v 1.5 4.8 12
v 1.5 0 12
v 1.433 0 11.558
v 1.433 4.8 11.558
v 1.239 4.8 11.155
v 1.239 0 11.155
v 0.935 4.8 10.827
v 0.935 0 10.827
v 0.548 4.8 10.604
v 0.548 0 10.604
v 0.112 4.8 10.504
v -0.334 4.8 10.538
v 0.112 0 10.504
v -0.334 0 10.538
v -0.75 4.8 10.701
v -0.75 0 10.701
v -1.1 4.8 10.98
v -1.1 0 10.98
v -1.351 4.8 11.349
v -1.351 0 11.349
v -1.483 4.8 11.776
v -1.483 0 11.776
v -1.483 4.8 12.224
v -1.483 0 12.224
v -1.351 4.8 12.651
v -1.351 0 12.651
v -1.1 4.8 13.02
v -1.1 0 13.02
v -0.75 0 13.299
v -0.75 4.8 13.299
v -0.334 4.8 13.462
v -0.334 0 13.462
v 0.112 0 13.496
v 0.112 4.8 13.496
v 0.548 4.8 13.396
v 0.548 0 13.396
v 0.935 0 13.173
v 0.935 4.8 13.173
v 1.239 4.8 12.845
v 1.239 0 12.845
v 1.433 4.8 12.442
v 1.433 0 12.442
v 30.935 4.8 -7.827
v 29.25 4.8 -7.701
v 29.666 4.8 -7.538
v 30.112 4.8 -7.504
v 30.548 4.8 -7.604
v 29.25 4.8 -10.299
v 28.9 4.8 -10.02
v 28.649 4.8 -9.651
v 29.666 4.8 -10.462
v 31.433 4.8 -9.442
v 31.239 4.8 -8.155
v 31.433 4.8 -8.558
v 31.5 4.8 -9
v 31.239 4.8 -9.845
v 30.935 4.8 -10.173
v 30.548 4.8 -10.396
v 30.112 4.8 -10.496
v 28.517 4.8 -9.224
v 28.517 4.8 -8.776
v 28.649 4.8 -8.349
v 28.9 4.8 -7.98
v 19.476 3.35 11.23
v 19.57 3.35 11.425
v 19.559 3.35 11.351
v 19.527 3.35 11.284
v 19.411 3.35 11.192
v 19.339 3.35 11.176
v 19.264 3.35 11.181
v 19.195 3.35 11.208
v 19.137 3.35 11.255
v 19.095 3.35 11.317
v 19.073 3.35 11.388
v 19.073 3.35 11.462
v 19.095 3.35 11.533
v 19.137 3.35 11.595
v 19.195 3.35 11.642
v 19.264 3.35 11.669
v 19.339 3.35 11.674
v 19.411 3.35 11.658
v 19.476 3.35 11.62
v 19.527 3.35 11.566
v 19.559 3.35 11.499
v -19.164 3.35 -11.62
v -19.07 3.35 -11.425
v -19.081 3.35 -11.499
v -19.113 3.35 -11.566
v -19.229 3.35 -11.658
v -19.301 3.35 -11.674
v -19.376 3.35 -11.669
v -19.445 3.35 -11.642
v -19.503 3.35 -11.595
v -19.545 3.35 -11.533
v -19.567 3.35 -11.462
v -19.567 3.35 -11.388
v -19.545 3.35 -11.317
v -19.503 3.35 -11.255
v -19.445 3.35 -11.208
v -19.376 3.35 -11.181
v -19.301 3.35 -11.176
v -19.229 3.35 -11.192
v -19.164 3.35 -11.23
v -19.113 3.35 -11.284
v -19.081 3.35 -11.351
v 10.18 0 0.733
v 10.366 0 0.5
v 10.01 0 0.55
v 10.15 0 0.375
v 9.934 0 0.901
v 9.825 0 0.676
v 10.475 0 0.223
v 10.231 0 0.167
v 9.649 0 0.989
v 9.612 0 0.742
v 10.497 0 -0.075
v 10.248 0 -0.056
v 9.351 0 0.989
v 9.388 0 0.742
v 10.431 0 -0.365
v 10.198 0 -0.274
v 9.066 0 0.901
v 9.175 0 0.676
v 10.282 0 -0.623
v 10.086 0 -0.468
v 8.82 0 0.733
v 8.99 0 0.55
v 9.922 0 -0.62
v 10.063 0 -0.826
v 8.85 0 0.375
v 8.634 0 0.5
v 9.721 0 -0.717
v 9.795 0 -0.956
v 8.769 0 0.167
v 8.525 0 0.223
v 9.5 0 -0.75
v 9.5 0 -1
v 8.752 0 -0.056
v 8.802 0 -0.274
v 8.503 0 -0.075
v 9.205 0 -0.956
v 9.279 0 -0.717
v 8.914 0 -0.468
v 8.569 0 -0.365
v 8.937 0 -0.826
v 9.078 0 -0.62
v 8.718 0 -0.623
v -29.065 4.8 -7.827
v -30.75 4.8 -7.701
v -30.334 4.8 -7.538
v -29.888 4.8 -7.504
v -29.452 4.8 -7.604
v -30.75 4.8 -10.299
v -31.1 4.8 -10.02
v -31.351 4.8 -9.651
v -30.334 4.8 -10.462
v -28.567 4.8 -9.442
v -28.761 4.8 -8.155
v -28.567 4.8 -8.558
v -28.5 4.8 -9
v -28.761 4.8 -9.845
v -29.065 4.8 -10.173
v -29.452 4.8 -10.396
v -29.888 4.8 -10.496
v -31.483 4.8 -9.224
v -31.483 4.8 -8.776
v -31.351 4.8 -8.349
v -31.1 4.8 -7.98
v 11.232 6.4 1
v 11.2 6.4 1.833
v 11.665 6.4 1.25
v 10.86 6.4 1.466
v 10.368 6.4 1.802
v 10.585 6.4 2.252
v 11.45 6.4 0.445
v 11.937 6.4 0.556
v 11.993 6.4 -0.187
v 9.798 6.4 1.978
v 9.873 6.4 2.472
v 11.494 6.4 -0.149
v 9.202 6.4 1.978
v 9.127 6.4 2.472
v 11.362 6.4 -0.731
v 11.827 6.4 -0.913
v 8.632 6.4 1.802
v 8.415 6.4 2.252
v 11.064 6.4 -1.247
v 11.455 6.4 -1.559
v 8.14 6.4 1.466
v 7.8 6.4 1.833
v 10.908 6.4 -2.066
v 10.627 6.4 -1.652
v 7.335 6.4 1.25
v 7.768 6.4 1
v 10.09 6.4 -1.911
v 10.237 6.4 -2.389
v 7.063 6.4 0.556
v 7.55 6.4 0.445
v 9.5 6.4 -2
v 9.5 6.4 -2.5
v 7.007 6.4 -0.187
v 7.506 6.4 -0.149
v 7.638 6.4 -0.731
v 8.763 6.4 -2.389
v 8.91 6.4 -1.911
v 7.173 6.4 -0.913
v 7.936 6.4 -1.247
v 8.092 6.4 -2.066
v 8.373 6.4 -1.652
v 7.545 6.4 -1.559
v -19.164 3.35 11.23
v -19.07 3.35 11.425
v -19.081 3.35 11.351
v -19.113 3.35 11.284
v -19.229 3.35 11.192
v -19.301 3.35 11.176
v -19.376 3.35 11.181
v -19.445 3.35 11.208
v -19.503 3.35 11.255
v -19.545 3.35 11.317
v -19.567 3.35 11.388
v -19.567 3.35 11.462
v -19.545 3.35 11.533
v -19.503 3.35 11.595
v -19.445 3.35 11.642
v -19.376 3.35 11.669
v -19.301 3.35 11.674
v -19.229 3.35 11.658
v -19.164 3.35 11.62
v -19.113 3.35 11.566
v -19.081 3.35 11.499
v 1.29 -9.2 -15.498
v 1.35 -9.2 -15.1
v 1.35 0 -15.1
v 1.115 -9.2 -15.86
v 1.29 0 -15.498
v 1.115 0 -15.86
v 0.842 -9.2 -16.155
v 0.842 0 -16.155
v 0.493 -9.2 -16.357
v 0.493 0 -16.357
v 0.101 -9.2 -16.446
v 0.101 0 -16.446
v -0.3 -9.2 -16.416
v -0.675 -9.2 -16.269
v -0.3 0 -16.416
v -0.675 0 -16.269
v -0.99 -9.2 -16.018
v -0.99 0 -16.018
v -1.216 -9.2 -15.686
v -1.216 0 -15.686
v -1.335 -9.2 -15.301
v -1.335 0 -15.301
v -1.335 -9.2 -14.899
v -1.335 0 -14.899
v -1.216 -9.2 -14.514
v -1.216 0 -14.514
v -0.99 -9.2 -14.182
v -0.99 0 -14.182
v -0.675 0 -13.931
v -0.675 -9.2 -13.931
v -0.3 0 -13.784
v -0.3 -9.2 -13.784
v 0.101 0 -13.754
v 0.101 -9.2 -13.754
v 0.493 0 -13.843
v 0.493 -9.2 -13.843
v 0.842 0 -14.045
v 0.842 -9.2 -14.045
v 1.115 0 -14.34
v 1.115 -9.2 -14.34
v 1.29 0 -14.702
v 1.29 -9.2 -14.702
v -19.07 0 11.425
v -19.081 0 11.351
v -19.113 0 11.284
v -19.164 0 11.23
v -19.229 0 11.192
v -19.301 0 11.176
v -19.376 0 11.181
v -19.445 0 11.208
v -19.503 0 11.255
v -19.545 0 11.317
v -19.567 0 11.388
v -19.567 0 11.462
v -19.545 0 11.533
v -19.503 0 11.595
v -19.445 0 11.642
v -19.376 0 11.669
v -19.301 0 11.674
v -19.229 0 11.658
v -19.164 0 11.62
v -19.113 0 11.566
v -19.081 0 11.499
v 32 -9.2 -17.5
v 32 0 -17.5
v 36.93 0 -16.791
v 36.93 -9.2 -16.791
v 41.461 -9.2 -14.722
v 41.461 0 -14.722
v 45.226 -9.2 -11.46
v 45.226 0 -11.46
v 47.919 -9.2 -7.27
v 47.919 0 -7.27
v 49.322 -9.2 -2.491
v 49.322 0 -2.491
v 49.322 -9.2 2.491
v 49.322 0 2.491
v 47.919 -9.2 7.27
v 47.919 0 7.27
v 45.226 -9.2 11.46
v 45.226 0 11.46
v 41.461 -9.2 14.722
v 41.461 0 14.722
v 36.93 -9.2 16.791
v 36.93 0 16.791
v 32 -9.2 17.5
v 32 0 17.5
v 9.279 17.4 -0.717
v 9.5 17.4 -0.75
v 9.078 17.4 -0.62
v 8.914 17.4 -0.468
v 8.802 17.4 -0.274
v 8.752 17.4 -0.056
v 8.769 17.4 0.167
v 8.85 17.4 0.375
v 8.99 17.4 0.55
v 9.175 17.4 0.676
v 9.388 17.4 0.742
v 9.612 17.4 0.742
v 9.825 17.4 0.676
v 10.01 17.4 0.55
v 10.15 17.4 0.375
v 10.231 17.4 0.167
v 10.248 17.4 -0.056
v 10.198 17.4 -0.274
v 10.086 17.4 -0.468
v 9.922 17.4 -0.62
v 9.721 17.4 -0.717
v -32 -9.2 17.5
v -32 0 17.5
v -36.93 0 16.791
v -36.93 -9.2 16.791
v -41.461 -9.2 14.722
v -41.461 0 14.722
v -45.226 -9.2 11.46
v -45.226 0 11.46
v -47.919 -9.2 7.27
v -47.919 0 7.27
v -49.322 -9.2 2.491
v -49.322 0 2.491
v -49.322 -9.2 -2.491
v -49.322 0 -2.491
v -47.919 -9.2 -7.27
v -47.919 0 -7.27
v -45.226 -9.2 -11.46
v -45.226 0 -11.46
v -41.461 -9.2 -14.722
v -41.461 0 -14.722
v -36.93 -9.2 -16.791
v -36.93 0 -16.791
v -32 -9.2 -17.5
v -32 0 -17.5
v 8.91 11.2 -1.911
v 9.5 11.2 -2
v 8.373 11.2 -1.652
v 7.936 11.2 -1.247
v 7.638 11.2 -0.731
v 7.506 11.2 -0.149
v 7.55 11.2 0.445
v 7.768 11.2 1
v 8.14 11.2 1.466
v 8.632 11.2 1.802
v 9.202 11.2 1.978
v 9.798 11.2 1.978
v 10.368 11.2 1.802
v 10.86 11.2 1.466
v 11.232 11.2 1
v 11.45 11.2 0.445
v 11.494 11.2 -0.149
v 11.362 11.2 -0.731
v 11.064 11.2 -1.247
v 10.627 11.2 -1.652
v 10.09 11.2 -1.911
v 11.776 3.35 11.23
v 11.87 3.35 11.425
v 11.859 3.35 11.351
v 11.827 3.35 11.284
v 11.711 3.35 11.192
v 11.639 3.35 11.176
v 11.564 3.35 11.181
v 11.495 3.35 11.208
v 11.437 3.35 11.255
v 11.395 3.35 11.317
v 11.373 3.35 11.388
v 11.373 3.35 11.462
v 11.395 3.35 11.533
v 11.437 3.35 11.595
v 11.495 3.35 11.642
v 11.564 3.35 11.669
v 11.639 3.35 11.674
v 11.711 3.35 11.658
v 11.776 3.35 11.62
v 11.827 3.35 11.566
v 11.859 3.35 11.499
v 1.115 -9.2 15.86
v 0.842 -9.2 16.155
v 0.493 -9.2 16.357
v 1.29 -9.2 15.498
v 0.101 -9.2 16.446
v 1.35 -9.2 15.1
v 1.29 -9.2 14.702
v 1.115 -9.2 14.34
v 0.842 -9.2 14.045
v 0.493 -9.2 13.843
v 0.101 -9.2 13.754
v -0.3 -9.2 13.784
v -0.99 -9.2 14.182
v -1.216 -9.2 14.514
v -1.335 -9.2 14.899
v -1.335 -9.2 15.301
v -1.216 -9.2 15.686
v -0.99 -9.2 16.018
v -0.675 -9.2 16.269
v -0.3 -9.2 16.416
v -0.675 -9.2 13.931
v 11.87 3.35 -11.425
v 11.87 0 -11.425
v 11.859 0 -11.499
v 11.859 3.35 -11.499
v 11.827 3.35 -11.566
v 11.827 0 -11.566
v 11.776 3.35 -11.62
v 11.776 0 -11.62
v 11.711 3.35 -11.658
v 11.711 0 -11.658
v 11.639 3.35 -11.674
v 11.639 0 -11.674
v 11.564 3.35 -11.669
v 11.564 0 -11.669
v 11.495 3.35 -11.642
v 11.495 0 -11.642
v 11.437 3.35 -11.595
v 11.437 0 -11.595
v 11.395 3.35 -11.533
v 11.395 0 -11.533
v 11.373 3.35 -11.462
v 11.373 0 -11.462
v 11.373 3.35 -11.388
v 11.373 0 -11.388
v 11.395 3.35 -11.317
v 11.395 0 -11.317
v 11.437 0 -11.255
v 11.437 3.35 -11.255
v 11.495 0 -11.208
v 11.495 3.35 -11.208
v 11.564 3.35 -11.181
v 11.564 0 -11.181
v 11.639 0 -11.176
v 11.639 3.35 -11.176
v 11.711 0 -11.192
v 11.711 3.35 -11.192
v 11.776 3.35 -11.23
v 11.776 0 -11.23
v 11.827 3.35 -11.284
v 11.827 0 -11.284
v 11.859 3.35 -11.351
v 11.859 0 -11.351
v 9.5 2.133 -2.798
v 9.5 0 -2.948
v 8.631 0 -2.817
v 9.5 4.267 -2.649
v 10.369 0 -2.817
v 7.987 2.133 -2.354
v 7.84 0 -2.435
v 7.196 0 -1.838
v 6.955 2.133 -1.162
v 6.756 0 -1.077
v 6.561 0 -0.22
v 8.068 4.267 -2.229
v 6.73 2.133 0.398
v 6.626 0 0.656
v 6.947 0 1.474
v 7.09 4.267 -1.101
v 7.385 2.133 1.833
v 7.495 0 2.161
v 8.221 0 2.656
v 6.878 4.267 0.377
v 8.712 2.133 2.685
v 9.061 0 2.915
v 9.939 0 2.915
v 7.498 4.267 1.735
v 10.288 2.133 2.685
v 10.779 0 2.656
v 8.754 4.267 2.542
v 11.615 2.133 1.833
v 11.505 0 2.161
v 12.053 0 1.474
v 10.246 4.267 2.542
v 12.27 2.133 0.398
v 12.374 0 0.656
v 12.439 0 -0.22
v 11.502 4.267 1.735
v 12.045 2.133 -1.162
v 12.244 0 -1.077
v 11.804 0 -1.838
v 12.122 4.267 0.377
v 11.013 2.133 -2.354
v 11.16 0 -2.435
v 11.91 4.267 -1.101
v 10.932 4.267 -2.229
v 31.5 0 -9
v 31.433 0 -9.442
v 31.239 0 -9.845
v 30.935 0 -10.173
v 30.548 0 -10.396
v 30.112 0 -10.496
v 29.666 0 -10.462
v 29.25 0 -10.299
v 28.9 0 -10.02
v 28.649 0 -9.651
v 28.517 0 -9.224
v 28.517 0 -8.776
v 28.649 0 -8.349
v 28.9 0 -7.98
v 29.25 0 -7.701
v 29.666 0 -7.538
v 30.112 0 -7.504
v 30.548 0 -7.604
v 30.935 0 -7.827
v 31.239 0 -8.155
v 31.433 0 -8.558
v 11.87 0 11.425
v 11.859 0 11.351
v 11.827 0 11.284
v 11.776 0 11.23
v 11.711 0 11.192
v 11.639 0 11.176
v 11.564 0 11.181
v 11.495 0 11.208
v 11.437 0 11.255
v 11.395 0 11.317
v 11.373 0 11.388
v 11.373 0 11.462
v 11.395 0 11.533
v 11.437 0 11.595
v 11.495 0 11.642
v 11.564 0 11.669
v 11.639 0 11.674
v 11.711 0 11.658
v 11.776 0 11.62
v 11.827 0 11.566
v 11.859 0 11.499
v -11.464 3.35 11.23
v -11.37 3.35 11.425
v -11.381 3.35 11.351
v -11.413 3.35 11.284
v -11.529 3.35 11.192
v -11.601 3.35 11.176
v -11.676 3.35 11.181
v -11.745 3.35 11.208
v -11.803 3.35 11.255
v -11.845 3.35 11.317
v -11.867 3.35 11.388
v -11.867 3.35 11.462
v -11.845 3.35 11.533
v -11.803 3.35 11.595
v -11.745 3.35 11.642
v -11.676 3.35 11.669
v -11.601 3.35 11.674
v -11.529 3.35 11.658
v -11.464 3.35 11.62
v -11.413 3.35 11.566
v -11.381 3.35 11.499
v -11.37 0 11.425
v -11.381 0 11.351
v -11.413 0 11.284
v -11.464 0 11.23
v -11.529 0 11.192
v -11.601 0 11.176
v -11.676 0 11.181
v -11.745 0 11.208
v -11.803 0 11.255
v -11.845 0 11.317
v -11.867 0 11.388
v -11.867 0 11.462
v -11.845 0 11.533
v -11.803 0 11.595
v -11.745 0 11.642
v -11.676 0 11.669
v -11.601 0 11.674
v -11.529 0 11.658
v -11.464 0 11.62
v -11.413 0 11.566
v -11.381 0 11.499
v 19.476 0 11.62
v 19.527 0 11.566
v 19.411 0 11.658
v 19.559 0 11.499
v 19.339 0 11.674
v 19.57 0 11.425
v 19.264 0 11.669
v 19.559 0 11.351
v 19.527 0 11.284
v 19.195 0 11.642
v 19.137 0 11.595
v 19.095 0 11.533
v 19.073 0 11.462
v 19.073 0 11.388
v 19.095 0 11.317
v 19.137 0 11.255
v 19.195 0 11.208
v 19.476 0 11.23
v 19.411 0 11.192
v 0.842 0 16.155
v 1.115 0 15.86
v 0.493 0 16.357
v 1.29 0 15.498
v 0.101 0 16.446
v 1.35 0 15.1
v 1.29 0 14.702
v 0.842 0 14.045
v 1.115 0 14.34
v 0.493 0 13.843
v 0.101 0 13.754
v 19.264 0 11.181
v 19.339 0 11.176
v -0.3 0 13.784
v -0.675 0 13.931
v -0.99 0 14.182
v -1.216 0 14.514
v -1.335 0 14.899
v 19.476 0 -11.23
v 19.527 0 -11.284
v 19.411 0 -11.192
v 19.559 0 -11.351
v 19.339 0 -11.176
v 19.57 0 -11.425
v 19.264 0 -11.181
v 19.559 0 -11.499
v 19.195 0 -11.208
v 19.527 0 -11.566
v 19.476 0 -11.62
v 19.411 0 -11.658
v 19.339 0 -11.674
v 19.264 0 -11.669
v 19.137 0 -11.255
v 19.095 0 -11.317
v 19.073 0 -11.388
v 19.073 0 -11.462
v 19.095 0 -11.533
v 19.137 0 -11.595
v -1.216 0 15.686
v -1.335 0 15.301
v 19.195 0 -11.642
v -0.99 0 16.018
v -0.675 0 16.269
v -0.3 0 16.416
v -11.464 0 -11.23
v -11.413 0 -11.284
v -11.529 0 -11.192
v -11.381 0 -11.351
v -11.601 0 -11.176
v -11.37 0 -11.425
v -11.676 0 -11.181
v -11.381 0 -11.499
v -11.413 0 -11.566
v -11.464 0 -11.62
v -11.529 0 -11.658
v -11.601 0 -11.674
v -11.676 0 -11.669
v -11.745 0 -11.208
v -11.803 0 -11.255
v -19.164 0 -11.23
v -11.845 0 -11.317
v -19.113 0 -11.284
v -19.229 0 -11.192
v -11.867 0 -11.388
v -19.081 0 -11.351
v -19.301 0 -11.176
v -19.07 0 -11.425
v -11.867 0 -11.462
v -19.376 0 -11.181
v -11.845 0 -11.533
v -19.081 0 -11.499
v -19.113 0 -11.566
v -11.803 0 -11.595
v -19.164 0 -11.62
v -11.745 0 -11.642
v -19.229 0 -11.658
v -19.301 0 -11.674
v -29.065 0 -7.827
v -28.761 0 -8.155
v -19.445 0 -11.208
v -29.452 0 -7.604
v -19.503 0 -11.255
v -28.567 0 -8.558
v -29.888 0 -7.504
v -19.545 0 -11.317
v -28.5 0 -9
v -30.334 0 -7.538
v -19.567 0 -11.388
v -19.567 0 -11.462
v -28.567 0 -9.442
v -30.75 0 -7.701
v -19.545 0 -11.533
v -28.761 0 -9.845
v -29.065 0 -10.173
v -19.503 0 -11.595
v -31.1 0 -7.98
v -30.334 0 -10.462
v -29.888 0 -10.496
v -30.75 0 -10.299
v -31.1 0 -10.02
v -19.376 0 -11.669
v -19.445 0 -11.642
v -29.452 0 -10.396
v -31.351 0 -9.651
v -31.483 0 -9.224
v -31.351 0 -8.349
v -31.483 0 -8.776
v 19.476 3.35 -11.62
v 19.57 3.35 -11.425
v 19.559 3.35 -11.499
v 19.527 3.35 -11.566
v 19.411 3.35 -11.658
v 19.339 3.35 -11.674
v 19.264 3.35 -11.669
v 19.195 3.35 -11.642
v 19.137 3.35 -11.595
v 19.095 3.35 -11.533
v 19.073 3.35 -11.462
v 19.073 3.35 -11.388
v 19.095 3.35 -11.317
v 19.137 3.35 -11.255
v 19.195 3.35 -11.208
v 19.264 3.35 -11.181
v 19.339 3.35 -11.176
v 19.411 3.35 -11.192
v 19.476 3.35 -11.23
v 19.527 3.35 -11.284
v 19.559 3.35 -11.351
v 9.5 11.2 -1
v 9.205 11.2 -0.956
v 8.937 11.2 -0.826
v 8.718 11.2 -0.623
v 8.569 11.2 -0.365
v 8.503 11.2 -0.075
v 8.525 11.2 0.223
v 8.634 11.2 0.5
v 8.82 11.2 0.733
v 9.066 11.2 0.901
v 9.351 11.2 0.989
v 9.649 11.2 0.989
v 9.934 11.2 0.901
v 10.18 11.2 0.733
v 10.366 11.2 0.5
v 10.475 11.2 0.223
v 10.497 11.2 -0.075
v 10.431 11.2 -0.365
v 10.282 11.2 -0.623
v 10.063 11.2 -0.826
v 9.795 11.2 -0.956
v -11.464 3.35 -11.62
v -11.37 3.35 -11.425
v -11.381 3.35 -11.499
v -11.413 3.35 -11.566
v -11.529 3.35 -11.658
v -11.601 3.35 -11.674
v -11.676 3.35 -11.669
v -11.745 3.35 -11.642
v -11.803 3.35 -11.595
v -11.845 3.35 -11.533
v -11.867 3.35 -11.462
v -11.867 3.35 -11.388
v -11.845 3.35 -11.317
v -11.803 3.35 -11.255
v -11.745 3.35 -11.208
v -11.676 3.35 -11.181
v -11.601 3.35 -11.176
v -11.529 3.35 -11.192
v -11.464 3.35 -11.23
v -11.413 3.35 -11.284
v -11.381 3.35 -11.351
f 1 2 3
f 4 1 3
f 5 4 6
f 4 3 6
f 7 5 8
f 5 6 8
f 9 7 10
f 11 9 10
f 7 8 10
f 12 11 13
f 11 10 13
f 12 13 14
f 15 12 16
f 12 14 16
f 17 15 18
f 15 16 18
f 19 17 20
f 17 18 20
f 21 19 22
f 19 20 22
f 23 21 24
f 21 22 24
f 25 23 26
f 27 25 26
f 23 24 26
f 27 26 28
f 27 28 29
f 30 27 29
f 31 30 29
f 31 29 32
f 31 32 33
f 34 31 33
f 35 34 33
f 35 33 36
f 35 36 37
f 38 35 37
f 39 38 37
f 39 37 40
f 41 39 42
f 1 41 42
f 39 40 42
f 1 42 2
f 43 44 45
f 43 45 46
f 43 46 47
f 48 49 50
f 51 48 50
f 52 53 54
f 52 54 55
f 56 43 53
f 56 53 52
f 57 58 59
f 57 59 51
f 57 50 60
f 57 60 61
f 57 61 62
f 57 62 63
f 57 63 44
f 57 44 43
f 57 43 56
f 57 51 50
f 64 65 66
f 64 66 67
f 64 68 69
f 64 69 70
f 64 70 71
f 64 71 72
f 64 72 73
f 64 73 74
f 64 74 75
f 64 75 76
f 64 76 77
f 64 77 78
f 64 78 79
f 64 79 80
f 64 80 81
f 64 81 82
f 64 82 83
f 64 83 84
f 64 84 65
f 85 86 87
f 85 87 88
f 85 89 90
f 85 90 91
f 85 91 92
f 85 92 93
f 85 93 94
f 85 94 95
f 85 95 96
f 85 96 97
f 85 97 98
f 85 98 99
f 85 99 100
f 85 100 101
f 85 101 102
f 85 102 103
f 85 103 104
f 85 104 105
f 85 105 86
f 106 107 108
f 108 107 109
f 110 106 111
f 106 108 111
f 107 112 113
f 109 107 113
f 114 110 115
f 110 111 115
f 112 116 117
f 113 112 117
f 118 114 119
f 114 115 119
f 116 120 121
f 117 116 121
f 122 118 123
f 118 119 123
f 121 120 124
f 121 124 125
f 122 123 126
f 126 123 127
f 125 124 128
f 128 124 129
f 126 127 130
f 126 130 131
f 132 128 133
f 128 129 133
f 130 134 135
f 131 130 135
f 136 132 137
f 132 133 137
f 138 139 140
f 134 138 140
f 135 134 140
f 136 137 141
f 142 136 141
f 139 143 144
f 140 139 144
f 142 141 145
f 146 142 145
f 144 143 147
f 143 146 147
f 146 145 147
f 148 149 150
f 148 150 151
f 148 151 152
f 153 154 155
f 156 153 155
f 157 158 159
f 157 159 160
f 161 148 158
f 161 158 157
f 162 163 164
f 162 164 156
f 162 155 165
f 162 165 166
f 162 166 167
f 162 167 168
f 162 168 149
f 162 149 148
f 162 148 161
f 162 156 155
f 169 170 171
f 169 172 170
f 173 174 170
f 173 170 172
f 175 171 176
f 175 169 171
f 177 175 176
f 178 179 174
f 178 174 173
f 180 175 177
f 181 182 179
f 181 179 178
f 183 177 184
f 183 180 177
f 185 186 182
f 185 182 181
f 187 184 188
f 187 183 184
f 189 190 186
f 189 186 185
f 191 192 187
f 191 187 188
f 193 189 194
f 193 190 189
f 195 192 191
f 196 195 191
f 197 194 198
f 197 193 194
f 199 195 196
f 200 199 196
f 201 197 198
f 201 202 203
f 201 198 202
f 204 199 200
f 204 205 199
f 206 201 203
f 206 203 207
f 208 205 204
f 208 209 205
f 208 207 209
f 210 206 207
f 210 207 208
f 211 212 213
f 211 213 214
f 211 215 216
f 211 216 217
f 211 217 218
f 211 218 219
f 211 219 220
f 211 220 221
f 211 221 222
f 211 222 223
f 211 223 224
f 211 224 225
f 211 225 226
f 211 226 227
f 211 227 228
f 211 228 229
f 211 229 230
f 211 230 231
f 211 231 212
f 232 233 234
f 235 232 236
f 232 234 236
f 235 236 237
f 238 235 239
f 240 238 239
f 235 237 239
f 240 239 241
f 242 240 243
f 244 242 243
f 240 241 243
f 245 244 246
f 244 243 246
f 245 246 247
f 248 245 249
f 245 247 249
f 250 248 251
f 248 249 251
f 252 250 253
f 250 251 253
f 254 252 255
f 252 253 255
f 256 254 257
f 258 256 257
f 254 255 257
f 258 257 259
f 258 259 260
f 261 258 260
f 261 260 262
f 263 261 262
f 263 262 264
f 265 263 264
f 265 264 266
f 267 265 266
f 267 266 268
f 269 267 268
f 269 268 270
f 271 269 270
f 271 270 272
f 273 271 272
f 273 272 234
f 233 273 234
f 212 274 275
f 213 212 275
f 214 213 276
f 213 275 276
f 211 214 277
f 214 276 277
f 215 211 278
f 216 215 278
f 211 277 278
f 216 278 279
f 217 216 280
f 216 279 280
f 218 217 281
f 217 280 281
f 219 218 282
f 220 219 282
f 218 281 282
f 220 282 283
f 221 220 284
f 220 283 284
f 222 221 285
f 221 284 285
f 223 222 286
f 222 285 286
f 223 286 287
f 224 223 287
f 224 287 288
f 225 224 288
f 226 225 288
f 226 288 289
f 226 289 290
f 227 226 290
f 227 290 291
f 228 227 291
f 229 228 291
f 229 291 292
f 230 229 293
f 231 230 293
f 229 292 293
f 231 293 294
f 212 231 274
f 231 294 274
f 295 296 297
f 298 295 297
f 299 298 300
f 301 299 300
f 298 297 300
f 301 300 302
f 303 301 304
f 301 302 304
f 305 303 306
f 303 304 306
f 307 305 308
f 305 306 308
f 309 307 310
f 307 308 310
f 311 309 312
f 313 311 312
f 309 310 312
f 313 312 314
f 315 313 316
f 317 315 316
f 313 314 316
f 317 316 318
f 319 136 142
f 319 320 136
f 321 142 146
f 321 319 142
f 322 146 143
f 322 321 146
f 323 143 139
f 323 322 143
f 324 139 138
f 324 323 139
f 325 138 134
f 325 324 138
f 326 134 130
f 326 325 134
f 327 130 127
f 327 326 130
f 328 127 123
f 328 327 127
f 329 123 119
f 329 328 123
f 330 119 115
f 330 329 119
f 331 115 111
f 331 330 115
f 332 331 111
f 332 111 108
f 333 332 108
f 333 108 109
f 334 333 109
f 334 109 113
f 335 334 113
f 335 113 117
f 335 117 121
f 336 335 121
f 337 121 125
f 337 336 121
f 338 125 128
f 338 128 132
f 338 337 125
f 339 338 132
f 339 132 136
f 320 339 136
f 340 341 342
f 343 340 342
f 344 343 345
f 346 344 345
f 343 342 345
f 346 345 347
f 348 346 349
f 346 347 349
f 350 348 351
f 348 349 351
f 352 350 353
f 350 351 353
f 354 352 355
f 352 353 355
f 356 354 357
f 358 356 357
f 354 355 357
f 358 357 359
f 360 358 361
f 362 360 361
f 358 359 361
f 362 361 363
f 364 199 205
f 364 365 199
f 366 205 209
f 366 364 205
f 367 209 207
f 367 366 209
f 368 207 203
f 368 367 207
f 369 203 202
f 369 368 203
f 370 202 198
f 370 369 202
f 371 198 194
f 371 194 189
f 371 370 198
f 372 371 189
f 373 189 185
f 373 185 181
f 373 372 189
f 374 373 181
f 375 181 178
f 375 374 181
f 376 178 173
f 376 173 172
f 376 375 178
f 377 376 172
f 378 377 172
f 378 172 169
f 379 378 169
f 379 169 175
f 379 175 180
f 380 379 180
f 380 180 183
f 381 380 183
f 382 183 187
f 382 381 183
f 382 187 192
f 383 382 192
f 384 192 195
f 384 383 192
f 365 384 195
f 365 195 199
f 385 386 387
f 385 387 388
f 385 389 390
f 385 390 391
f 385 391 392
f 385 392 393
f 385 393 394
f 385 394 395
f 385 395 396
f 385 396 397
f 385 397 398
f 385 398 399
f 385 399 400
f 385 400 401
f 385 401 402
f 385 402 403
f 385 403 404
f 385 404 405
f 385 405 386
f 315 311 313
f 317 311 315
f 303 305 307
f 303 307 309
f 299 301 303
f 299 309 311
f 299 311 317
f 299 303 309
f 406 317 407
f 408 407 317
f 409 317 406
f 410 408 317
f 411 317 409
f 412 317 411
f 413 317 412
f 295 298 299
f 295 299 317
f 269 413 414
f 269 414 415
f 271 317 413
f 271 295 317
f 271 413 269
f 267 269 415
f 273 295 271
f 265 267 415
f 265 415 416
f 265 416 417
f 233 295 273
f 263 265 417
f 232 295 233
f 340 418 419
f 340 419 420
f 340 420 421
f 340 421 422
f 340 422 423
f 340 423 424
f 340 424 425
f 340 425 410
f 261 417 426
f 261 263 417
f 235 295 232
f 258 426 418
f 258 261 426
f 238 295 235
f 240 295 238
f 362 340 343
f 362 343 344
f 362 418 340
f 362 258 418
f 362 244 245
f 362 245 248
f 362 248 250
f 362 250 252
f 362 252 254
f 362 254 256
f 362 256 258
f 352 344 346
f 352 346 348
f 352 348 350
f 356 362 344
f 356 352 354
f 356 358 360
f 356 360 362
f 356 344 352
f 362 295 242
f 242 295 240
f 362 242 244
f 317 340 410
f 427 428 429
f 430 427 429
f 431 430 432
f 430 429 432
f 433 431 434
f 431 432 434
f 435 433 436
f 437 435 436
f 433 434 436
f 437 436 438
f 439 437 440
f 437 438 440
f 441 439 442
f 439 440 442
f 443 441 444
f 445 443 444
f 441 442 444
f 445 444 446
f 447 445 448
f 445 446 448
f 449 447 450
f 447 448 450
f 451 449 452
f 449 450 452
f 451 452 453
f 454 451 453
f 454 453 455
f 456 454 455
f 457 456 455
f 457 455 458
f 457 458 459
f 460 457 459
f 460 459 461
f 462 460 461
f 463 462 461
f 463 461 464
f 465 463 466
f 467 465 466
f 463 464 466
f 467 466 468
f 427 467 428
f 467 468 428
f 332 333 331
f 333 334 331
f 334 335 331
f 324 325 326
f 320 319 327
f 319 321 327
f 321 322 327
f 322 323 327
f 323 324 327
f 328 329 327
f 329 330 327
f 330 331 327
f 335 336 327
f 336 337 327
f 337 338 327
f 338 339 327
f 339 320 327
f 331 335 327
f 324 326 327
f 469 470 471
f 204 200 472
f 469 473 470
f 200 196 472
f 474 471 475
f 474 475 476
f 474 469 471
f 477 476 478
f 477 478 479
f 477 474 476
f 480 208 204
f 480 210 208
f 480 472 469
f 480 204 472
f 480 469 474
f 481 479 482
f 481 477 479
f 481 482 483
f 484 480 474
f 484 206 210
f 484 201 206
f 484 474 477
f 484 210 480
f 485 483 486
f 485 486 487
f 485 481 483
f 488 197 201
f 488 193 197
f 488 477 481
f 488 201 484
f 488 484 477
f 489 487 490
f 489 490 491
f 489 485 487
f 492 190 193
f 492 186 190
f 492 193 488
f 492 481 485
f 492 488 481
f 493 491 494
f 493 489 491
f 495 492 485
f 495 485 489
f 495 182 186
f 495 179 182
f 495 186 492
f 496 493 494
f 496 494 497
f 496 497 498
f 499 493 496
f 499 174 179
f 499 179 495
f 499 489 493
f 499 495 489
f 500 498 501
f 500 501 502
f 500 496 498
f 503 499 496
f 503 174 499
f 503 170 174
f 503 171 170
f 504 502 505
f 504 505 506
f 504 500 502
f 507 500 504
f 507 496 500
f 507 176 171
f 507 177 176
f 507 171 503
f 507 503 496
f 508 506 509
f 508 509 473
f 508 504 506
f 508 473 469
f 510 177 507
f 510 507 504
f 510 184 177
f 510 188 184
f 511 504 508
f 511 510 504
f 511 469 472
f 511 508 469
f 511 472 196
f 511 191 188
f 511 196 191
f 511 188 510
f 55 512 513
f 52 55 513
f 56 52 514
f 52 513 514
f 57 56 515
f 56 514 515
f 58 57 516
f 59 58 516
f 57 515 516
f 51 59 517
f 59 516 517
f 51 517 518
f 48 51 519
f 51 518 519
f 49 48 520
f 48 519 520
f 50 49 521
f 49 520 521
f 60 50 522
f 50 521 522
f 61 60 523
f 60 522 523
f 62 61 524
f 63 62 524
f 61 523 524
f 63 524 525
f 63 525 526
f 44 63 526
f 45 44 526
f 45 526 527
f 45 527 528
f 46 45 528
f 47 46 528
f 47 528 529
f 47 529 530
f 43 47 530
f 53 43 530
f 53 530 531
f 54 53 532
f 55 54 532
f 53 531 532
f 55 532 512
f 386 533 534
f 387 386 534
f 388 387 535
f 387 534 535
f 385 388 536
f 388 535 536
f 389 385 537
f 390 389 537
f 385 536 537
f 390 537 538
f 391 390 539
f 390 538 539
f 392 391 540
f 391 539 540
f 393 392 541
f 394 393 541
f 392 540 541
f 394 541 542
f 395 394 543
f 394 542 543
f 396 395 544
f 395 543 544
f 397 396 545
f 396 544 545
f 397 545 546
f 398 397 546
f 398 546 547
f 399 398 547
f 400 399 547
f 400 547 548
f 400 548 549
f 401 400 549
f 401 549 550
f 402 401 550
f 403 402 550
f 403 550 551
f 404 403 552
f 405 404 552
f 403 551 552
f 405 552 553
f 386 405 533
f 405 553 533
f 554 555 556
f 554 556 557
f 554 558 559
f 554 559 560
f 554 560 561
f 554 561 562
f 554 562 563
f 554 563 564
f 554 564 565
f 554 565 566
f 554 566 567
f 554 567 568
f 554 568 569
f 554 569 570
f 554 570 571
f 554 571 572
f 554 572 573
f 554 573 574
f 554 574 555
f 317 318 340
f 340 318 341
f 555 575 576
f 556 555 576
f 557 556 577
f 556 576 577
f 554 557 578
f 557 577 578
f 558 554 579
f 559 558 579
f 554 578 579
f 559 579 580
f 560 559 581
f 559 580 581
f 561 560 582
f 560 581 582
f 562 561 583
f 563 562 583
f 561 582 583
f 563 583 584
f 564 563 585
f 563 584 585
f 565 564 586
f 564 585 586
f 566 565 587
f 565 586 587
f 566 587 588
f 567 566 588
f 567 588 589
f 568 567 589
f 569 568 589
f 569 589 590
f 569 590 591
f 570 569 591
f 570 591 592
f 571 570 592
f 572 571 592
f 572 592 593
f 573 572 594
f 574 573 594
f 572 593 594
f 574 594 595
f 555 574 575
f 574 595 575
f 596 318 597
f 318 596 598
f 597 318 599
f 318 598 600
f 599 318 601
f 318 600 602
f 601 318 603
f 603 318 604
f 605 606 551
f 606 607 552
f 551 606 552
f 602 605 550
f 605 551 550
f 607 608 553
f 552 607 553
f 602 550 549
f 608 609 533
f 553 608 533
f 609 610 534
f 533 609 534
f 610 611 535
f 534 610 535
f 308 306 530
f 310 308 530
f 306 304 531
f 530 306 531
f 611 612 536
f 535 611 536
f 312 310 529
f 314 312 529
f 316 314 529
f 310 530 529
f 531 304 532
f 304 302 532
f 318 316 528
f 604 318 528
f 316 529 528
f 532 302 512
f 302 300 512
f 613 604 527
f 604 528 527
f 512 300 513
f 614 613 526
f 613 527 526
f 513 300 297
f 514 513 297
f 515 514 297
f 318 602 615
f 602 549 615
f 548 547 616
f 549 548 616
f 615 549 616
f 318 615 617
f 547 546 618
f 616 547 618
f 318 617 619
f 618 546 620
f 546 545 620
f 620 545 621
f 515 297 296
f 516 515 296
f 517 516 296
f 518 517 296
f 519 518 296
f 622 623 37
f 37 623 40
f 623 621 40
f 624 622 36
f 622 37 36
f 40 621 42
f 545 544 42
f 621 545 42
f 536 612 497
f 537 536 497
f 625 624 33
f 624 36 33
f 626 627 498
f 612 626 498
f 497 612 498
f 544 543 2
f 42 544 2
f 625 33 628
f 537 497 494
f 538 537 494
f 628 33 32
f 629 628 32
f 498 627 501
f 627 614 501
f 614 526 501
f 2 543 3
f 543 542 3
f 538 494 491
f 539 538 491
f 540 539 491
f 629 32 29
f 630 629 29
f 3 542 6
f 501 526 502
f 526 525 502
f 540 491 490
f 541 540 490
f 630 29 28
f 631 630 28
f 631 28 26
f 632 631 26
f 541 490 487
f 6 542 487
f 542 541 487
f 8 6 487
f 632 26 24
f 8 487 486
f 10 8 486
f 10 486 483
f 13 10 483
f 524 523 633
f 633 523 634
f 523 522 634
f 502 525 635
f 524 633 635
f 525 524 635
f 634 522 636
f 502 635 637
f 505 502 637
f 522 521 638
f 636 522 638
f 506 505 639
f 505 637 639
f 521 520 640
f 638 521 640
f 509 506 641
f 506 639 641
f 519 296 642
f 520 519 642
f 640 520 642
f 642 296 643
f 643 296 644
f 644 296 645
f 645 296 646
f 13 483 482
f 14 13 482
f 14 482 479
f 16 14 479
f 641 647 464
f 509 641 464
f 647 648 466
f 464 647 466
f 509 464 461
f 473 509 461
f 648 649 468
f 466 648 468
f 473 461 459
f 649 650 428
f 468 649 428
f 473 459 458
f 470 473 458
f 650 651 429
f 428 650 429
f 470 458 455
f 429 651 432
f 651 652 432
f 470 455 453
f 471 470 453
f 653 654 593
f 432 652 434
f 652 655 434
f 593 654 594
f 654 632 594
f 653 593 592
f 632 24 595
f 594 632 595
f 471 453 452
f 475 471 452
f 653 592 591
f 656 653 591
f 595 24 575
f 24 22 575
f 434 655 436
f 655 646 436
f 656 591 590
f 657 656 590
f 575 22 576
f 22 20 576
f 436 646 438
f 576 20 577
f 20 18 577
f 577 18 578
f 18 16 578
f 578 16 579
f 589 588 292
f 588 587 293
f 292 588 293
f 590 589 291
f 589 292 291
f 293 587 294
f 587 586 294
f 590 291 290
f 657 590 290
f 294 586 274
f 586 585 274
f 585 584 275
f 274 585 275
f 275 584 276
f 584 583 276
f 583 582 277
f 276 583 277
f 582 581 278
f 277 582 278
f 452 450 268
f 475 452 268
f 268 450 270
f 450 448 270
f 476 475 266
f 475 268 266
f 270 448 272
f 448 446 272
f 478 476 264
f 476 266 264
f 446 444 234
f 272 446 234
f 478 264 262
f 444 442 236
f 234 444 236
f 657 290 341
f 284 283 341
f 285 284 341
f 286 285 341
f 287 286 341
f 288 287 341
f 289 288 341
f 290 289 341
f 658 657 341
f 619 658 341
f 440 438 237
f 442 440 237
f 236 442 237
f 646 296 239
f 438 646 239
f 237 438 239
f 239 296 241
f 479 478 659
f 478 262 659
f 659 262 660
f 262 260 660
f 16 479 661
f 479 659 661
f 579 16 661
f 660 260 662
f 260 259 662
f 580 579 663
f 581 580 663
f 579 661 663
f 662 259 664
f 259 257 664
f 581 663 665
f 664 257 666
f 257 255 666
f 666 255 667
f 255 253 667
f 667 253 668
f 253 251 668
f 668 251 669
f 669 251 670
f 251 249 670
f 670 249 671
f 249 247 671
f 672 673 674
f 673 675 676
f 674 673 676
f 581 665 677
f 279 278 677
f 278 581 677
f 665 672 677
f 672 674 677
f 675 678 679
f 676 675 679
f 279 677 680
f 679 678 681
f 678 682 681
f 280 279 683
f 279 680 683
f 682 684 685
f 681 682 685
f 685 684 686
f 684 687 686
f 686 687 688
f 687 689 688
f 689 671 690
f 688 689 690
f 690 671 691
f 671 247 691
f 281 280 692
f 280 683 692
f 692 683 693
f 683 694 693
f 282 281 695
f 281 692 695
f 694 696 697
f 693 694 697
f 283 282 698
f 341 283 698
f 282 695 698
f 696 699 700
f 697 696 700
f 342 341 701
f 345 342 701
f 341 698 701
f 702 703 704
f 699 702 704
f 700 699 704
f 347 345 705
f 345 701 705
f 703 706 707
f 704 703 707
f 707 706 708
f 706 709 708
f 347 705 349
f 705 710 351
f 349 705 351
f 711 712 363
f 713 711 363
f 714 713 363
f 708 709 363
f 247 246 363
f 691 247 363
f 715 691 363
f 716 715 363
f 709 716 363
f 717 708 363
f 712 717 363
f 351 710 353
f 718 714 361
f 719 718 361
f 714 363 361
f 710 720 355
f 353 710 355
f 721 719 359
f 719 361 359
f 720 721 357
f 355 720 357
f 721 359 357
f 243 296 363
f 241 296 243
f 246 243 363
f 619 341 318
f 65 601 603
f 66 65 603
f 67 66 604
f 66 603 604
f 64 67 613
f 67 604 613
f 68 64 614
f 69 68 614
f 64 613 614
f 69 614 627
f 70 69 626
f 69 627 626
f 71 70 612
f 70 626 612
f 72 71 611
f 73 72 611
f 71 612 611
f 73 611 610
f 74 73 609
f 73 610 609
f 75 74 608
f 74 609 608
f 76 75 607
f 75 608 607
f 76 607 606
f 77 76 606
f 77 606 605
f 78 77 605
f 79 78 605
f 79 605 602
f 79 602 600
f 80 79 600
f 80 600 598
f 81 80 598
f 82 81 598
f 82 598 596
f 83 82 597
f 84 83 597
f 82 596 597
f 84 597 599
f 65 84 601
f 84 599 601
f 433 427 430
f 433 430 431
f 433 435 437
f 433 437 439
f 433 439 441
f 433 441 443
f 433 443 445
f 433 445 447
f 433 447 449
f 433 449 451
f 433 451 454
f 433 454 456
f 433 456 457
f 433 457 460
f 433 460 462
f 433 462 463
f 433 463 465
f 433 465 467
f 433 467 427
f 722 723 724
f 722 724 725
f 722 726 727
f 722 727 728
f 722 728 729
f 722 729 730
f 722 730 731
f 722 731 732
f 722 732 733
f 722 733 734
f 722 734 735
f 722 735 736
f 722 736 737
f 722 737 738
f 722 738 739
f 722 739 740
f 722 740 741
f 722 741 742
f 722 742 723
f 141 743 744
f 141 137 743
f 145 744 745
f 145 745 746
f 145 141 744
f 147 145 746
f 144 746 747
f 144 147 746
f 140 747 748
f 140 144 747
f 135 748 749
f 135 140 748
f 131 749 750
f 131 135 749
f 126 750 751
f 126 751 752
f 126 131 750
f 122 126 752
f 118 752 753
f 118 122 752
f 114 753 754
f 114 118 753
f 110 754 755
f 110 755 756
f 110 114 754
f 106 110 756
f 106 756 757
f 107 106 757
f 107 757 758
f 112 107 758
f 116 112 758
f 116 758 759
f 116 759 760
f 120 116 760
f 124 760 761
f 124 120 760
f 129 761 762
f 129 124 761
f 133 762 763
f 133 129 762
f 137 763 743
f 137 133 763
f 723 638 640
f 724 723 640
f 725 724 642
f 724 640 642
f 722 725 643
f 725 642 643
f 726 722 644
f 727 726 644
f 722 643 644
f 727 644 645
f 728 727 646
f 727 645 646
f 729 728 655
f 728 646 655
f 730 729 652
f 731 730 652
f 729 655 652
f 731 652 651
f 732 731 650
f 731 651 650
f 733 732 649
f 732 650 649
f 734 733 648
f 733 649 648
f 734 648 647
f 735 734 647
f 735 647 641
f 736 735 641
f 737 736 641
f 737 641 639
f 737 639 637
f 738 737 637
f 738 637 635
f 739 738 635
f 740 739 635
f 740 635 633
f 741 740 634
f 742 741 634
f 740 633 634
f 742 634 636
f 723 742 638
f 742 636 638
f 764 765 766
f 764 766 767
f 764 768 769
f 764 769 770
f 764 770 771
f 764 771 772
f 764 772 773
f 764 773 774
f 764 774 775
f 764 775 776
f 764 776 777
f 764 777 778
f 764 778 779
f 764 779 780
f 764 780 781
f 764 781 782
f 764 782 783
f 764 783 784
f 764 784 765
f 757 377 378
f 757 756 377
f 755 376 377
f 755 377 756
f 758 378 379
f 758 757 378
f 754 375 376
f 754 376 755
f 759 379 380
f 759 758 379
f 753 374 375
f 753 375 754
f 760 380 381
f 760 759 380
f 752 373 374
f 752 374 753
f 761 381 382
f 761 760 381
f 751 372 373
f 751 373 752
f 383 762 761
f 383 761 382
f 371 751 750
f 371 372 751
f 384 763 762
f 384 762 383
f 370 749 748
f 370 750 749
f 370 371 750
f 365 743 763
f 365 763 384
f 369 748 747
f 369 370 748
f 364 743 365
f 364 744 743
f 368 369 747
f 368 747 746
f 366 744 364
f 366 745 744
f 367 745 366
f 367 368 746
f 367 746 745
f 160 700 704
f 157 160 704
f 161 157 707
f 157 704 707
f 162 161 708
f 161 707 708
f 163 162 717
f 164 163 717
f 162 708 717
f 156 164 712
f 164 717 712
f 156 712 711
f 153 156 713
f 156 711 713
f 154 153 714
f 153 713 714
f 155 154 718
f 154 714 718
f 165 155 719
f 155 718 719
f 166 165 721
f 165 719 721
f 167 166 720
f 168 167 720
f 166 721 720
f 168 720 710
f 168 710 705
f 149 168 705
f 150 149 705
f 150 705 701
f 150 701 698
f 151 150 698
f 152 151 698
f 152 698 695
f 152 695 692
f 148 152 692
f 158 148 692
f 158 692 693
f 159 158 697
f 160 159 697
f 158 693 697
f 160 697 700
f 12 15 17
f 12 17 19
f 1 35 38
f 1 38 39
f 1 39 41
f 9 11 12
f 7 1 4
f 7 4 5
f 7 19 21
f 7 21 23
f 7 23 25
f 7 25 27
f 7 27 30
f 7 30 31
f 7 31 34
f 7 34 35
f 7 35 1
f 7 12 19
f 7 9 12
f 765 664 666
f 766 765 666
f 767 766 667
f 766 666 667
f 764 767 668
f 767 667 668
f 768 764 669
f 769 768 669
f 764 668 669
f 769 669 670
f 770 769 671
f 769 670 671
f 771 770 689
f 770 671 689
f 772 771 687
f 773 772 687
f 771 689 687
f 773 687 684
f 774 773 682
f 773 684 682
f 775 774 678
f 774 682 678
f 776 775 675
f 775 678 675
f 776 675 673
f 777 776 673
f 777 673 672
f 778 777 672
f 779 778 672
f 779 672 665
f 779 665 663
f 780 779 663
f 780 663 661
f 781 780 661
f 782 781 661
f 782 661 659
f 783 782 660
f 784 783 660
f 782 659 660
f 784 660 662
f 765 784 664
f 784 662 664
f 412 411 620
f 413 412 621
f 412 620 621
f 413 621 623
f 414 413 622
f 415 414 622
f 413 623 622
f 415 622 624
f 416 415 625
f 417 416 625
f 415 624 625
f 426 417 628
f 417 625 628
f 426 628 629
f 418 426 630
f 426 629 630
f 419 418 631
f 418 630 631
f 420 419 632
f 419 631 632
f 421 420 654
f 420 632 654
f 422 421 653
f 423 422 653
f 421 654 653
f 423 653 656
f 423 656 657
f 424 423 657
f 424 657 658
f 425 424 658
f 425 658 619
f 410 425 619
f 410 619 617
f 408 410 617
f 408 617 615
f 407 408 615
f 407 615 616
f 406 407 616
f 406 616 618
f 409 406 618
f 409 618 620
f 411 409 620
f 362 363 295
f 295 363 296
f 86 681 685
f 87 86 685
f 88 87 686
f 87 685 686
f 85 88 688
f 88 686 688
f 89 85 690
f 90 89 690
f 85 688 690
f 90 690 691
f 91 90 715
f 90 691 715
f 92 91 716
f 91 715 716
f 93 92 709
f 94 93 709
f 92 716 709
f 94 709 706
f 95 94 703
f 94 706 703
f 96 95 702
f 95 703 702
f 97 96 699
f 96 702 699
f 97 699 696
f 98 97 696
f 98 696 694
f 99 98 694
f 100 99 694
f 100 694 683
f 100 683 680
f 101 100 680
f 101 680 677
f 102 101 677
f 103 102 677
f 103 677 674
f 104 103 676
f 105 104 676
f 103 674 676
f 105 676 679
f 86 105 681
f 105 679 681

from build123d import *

# Parameters (mm, degrees)
BOSS_EXTRUDE1_DEPTH = 9.2
SKETCH2_W           = 0.75
SKETCH2_H           = 17.4
SKETCH3_R           = 1.5
BOSS_EXTRUDE2_DEPTH = 4.8
SKETCH4_R           = 0.25
BOSS_EXTRUDE3_DEPTH = 3.35
SKETCH5_R           = 1.35
CUT_EXTRUDE1_DEPTH  = 10.2


with BuildPart() as part:
    # Sketch1 → Boss-Extrude1 (new body)
    with BuildSketch(Plane(origin=(0, 0, 0), x_dir=(1, 0, 0), z_dir=(0, 1, 0))):
        with BuildLine():
            Line((-32, 17.5), (32, 17.5))
            ThreePointArc((32, 17.5), (49.5, 0), (32, -17.5))
            Line((32, -17.5), (-32, -17.5))
            ThreePointArc((-32, -17.5), (-49.5, 0), (-32, 17.5))
        make_face()
    extrude(amount=-BOSS_EXTRUDE1_DEPTH)

    # Sketch2 → Revolve1 (revolve)
    with BuildSketch(Plane(origin=(9.5, 0, 0), x_dir=(0, 0, -1), z_dir=(1, 0, 0))):
        with Locations((0.375, 8.7)):
            Rectangle(SKETCH2_W, SKETCH2_H)
        Polygon((1, 0), (2.947531596, 0), (2.5, 6.4), (2, 6.4), (2, 11.2), (1, 11.2), align=None)
    revolve(axis=Axis((9.5, 0, 0), (0, 1, 0)))

    # Sketch3 → Boss-Extrude2 (add)
    with BuildSketch(Plane(origin=(0, 0, 0), x_dir=(1, 0, 0), z_dir=(0, 1, 0))):
        with Locations((0, -12)):
            Circle(SKETCH3_R)
        with Locations((30, 9)):
            Circle(SKETCH3_R)
        with Locations((-30, 9)):
            Circle(SKETCH3_R)
    extrude(amount=BOSS_EXTRUDE2_DEPTH)

    # Sketch4 → Boss-Extrude3 (add)
    with BuildSketch(Plane(origin=(0, 0, 0), x_dir=(1, 0, 0), z_dir=(0, 1, 0))):
        with Locations((-19.32, 11.425)):
            Circle(SKETCH4_R)
        with Locations((-11.62, 11.425)):
            Circle(SKETCH4_R)
        with Locations((-11.62, -11.425)):
            Circle(SKETCH4_R)
        with Locations((-19.32, -11.425)):
            Circle(SKETCH4_R)
        with Locations((19.32, -11.425)):
            Circle(SKETCH4_R)
        with Locations((11.62, -11.425)):
            Circle(SKETCH4_R)
        with Locations((11.62, 11.425)):
            Circle(SKETCH4_R)
        with Locations((19.32, 11.425)):
            Circle(SKETCH4_R)
    extrude(amount=BOSS_EXTRUDE3_DEPTH)

    # Sketch5 → Cut-Extrude1 (cut, through all)
    with BuildSketch(Plane(origin=(0, 0, 0), x_dir=(1, 0, 0), z_dir=(0, 1, 0))):
        with Locations((0, 15.1)):
            Circle(SKETCH5_R)
        with Locations((0, -15.1)):
            Circle(SKETCH5_R)
    extrude(amount=-CUT_EXTRUDE1_DEPTH, mode=Mode.SUBTRACT)


solid = part.part
